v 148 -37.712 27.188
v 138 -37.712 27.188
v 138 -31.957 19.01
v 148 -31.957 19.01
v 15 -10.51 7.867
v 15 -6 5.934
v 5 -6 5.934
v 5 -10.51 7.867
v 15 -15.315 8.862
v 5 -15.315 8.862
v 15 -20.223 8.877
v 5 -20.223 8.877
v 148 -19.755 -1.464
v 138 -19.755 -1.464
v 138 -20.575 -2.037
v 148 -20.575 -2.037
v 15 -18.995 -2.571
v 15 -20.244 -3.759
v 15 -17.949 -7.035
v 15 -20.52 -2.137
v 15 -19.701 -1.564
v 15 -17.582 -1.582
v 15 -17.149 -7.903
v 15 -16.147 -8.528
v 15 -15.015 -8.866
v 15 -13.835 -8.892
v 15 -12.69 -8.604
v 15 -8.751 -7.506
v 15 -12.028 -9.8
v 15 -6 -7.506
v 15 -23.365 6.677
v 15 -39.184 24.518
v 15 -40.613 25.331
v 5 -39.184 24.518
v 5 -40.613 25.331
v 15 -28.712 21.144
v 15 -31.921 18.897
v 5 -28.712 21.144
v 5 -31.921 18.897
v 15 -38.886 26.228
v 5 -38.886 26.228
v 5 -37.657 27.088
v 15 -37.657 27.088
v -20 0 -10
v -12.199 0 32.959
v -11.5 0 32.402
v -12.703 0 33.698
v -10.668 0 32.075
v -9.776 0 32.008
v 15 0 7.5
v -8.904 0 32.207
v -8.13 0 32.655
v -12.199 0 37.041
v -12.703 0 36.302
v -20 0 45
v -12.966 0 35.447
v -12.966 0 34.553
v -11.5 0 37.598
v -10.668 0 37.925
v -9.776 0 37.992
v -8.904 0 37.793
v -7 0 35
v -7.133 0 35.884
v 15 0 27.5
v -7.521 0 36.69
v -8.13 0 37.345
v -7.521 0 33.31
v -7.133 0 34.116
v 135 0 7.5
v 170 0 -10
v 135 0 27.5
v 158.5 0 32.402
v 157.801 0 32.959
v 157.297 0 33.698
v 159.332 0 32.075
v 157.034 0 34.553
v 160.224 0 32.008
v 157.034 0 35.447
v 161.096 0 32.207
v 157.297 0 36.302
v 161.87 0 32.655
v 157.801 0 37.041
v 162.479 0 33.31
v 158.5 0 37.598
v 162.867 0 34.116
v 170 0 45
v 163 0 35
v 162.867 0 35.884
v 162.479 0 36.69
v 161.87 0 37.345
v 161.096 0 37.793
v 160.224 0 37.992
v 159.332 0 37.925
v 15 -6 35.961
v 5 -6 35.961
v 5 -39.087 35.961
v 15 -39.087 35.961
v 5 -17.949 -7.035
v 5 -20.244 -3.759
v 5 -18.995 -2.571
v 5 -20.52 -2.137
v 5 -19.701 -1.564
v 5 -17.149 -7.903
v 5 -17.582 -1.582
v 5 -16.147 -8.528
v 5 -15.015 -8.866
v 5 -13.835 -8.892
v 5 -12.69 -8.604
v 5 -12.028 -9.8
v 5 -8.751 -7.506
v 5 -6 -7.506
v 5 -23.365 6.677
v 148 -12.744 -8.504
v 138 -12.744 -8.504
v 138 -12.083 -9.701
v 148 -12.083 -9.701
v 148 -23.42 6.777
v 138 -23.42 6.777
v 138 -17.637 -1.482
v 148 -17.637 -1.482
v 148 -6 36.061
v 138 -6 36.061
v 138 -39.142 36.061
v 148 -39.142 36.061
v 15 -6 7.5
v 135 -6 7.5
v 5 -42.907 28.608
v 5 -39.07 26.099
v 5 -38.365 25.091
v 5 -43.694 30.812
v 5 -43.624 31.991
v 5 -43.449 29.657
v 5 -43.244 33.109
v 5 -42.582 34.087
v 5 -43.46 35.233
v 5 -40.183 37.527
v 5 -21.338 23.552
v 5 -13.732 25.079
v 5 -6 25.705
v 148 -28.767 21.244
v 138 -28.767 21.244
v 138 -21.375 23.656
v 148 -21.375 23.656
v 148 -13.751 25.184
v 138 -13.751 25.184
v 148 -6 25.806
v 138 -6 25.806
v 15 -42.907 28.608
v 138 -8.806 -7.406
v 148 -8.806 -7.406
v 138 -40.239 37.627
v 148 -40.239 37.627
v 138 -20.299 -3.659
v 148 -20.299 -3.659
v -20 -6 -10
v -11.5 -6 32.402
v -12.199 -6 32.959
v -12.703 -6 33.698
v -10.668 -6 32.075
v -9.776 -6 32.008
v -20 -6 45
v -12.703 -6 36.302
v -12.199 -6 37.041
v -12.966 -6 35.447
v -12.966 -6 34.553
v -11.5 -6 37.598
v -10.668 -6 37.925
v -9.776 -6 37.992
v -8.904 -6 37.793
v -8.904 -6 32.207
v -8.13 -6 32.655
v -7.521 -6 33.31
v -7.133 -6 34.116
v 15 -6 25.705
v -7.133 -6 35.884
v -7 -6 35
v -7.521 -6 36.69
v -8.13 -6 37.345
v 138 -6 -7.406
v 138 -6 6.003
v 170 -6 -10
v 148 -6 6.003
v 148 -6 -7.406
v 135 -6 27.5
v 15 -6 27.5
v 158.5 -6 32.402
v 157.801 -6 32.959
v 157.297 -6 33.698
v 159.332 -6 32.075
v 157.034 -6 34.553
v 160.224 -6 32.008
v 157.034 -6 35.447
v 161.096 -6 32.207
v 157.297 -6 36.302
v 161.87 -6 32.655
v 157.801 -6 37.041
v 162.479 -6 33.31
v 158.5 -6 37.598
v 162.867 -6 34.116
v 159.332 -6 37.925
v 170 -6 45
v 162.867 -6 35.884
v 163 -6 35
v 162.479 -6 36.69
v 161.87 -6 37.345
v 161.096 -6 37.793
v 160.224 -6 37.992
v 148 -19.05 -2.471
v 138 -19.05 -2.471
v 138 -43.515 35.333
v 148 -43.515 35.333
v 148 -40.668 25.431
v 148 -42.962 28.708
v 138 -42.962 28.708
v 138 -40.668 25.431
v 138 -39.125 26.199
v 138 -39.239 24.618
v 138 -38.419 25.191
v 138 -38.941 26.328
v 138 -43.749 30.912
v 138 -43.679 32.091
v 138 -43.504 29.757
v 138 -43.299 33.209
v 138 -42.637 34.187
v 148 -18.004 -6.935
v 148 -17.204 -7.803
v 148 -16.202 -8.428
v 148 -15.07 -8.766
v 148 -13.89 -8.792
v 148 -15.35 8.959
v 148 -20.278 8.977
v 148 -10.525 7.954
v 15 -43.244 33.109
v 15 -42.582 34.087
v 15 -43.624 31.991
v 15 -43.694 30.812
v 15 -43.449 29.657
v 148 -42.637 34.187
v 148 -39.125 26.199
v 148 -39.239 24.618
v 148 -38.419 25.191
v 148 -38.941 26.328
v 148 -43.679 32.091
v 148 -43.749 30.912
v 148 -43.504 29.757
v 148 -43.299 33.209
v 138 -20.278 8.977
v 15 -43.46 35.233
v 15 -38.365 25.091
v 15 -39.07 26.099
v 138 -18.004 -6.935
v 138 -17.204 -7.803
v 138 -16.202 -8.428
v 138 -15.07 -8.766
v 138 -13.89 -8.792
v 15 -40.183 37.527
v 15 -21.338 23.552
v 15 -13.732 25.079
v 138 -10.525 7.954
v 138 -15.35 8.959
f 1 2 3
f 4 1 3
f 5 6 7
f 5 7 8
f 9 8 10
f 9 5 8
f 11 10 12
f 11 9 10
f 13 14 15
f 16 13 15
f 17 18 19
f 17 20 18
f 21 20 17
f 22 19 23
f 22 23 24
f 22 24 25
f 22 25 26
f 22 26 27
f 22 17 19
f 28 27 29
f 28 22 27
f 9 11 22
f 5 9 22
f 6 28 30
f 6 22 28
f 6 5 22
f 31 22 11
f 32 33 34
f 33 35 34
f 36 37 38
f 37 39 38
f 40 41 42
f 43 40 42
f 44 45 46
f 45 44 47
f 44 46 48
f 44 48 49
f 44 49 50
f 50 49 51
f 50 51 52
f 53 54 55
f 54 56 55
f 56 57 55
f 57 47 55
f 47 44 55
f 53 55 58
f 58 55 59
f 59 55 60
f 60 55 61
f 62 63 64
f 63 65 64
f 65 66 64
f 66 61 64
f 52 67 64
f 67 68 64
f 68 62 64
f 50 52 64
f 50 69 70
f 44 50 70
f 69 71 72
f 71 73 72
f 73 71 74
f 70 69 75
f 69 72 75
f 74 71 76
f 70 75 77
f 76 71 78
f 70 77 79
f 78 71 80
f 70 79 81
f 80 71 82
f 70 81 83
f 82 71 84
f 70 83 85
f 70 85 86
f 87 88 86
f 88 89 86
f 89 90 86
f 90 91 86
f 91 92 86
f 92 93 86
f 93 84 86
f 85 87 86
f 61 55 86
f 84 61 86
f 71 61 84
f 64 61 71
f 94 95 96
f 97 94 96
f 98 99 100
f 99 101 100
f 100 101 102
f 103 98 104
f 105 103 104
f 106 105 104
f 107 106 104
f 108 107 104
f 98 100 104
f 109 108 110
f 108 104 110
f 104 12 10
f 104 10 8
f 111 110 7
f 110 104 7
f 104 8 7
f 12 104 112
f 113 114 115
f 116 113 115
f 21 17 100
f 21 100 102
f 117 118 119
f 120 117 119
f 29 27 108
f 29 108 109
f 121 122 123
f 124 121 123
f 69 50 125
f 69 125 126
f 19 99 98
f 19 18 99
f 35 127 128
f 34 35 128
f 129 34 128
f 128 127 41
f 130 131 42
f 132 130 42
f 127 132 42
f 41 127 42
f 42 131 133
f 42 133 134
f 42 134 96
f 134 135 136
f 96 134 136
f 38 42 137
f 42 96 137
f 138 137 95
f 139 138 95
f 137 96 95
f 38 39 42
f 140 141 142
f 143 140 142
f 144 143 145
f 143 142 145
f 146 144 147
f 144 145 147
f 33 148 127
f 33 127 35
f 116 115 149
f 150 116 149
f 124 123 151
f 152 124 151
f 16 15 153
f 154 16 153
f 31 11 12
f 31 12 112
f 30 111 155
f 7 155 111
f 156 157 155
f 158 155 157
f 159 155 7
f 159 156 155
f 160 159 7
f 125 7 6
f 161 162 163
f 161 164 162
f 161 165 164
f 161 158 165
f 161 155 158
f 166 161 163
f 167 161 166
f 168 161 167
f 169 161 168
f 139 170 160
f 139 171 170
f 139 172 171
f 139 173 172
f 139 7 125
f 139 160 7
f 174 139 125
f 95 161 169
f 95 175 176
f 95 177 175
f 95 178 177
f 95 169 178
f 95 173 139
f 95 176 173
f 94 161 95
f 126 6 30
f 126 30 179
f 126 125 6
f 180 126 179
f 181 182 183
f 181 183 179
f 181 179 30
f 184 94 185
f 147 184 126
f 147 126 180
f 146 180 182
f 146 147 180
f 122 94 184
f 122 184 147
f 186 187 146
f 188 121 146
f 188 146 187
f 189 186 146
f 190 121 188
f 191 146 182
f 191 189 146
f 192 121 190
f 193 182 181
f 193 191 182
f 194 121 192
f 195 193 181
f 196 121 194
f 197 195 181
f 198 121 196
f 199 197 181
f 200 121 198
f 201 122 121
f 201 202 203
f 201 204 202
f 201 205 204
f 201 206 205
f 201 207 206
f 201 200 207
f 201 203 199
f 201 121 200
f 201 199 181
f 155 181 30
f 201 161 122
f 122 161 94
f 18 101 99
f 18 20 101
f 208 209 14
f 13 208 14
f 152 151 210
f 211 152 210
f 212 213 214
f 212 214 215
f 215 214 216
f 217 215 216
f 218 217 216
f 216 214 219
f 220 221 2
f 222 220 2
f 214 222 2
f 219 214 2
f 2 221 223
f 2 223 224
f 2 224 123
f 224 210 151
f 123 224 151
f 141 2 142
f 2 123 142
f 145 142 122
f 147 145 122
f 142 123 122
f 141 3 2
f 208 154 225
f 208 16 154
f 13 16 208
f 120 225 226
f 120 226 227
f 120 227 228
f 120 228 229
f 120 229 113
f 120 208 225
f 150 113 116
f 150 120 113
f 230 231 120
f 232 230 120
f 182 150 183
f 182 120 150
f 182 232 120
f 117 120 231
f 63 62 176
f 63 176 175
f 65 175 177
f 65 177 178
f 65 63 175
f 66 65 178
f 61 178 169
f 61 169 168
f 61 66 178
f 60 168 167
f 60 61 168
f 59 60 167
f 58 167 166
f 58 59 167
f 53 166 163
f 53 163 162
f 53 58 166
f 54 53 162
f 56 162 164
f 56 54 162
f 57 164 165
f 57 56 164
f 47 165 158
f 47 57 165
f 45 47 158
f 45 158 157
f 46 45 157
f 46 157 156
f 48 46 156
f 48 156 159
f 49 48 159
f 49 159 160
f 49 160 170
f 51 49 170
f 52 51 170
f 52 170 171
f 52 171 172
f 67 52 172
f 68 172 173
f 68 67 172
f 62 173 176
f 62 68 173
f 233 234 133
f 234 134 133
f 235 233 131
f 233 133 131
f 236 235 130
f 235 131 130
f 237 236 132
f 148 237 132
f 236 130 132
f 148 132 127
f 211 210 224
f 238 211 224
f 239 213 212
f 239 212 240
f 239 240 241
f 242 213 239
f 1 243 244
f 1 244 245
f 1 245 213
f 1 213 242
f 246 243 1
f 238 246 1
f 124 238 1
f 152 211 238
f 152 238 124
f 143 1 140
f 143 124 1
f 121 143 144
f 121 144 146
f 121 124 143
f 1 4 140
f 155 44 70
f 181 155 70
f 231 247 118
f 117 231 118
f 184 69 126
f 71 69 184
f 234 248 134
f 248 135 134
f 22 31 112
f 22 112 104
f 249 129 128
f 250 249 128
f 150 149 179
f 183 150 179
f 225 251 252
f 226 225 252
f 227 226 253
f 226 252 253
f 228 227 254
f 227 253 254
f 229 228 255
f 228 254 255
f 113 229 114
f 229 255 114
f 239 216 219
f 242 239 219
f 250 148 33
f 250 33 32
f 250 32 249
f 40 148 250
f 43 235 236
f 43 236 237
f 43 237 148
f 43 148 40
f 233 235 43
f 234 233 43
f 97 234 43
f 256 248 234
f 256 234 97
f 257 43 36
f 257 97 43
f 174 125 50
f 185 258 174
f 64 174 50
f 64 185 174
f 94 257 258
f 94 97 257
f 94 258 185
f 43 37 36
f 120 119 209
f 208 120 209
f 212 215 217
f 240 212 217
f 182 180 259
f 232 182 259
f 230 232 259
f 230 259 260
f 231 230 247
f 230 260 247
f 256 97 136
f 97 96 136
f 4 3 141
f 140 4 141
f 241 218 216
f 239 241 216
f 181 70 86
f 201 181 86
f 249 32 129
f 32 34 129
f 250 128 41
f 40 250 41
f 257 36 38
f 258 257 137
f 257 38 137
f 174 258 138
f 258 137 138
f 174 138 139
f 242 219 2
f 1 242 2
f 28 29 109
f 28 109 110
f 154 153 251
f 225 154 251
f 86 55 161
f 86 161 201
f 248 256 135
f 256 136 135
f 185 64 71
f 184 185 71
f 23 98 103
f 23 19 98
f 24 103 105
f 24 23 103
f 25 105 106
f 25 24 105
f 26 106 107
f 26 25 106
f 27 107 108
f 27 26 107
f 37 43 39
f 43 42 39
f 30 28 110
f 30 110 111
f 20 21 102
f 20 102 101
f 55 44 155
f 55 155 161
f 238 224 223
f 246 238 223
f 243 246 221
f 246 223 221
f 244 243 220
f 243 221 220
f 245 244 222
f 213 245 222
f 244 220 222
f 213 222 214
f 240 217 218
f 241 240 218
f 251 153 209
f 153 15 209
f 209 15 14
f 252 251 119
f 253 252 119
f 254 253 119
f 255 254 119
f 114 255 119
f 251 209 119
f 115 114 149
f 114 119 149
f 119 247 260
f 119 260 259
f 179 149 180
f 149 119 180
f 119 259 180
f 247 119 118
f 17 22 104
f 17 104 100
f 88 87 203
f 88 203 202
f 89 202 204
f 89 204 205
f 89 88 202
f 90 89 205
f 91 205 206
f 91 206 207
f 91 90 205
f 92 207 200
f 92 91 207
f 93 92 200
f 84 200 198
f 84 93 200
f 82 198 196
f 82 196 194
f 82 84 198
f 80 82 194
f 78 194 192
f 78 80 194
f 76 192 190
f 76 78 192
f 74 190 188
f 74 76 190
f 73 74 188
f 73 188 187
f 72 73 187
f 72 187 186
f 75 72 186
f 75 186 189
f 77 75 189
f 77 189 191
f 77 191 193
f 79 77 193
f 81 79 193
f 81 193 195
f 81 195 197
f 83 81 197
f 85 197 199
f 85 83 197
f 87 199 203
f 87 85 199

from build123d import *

# Parameters (mm, degrees)
F1_W     = 190
F1_H     = 55
F1_R     = 3
F1_W_2   = 120
F1_H_2   = 20
F2_DEPTH = 6
F7_DEPTH = 5
F8_DEPTH = 10


with BuildPart() as f2:
    # F1 (on Front) → F2 (new body)
    with BuildSketch(Plane.XZ):
        with Locations((75, 17.5)):
            Rectangle(F1_W, F1_H)
        with Locations((-10, 35)):
            Circle(F1_R, mode=Mode.SUBTRACT)
        with Locations((75, 17.5)):
            Rectangle(F1_W_2, F1_H_2, mode=Mode.SUBTRACT)
        with Locations((160, 35)):
            Circle(F1_R, mode=Mode.SUBTRACT)
    extrude(amount=F2_DEPTH)

    # F6 (on offset) → F7 (join, symmetric)
    with BuildSketch(Plane.YZ.offset(10)):
        with BuildLine():
            Line((-38.885744, 26.227702), (-37.657016, 27.088066))
            Line((-37.657016, 27.088066), (-31.921252, 18.896546))
            Line((-31.921252, 18.896546), (-28.711814, 21.143818))
            Line((-28.711814, 21.143818), (-39.086786, 35.960815))
            Line((-39.086786, 35.960815), (-40.183468, 37.527037))
            Line((-40.183468, 37.527037), (-43.460076, 35.232732))
            Line((-43.460076, 35.232732), (-42.582241, 34.087168))
            ThreePointArc((-42.582241, 34.087168), (-43.698463, 31.404123), (-42.907039, 28.607995))
            Line((-42.907039, 28.607995), (-40.612733, 25.331387))
            Line((-40.612733, 25.331387), (-39.183706, 24.517514))
            Line((-39.183706, 24.517514), (-38.364554, 25.09109))
            Line((-38.364554, 25.09109), (-39.070053, 26.098647))
            Line((-39.070053, 26.098647), (-38.885744, 26.227702))
        make_face()
        with BuildLine():
            Line((-39.086786, 35.960815), (-28.711814, 21.143818))
            ThreePointArc((-28.711814, 21.143818), (-16.759457, 24.582262), (-4.374549, 25.720592))
            Line((-4.374549, 25.720592), (-4.374549, 35.960815))
            Line((-4.374549, 35.960815), (-39.086786, 35.960815))
        make_face()
        with BuildLine():
            ThreePointArc((-17.949438, -7.035153), (-15.59262, -8.73518), (-12.689612, -8.60393))
            Line((-12.689612, -8.60393), (-17.581842, -1.582256))
            Line((-17.581842, -1.582256), (-17.58209, -1.581899))
            Line((-17.58209, -1.581899), (-18.995128, -2.571318))
            Line((-18.995128, -2.571318), (-19.700627, -1.563761))
            Line((-19.700627, -1.563761), (-20.519779, -2.137338))
            Line((-20.519779, -2.137338), (-20.243744, -3.758545))
            Line((-20.243744, -3.758545), (-17.949438, -7.035153))
        make_face()
        Polygon((-17.581842, -1.582256), (-12.689612, -8.60393), (-12.027587, -9.800477), (-8.750979, -7.506171), (-20.222507, 8.876869), (-23.364775, 6.67663), (-17.58209, -1.581899), align=None)
        with BuildLine():
            Line((-20.222507, 8.876869), (-8.750979, -7.506171))
            Line((-8.750979, -7.506171), (-4.07082, -7.506171))
            Line((-4.07082, -7.506171), (-4.07082, 4.745829))
            ThreePointArc((-4.07082, 4.745829), (-11.783832, 8.229962), (-20.222507, 8.876869))
        make_face()
    extrude(amount=F7_DEPTH, both=True)

    # F5 (on offset) → F8 (join)
    with BuildSketch(Plane.YZ.offset(138)):
        with BuildLine():
            Line((-38.940573, 26.327715), (-37.711845, 27.188079))
            Line((-37.711845, 27.188079), (-31.957074, 19.010133))
            Line((-31.957074, 19.010133), (-28.767087, 21.243786))
            Line((-28.767087, 21.243786), (-39.142092, 36.060827))
            Line((-39.142092, 36.060827), (-40.238616, 37.626827))
            Line((-40.238616, 37.626827), (-43.515224, 35.332521))
            Line((-43.515224, 35.332521), (-42.63707, 34.187181))
            ThreePointArc((-42.63707, 34.187181), (-43.753291, 31.504136), (-42.961868, 28.708008))
            Line((-42.961868, 28.708008), (-40.667562, 25.4314))
            Line((-40.667562, 25.4314), (-39.238535, 24.617526))
            Line((-39.238535, 24.617526), (-38.419383, 25.191103))
            Line((-38.419383, 25.191103), (-39.124882, 26.19866))
            Line((-39.124882, 26.19866), (-38.940573, 26.327715))
        make_face()
        with BuildLine():
            Line((-39.142092, 36.060827), (-28.767087, 21.243786))
            ThreePointArc((-28.767087, 21.243786), (-16.81473, 24.682229), (-4.429822, 25.820559))
            Line((-4.429822, 25.820559), (-4.429822, 36.060827))
            Line((-4.429822, 36.060827), (-39.142092, 36.060827))
        make_face()
        with BuildLine():
            ThreePointArc((-18.004267, -6.93514), (-15.647449, -8.635167), (-12.744441, -8.503917))
            Line((-12.744441, -8.503917), (-17.636671, -1.482243))
            Line((-17.636671, -1.482243), (-17.636919, -1.481886))
            Line((-17.636919, -1.481886), (-19.049957, -2.471305))
            Line((-19.049957, -2.471305), (-19.755456, -1.463748))
            Line((-19.755456, -1.463748), (-20.574608, -2.037325))
            Line((-20.574608, -2.037325), (-20.298572, -3.658532))
            Line((-20.298572, -3.658532), (-18.004267, -6.93514))
        make_face()
        Polygon((-17.636671, -1.482243), (-12.744441, -8.503917), (-12.08271, -9.70067), (-8.806102, -7.406364), (-20.27763, 8.976676), (-23.419604, 6.776643), (-17.636919, -1.481886), align=None)
        with BuildLine():
            Line((-20.27763, 8.976676), (-8.806102, -7.406364))
            Line((-8.806102, -7.406364), (-4.125649, -7.406364))
            Line((-4.125649, -7.406364), (-4.125649, 4.845636))
            ThreePointArc((-4.125649, 4.845636), (-11.838801, 8.329821), (-20.27763, 8.976676))
        make_face()
    extrude(amount=F8_DEPTH)


solid = f2.part
